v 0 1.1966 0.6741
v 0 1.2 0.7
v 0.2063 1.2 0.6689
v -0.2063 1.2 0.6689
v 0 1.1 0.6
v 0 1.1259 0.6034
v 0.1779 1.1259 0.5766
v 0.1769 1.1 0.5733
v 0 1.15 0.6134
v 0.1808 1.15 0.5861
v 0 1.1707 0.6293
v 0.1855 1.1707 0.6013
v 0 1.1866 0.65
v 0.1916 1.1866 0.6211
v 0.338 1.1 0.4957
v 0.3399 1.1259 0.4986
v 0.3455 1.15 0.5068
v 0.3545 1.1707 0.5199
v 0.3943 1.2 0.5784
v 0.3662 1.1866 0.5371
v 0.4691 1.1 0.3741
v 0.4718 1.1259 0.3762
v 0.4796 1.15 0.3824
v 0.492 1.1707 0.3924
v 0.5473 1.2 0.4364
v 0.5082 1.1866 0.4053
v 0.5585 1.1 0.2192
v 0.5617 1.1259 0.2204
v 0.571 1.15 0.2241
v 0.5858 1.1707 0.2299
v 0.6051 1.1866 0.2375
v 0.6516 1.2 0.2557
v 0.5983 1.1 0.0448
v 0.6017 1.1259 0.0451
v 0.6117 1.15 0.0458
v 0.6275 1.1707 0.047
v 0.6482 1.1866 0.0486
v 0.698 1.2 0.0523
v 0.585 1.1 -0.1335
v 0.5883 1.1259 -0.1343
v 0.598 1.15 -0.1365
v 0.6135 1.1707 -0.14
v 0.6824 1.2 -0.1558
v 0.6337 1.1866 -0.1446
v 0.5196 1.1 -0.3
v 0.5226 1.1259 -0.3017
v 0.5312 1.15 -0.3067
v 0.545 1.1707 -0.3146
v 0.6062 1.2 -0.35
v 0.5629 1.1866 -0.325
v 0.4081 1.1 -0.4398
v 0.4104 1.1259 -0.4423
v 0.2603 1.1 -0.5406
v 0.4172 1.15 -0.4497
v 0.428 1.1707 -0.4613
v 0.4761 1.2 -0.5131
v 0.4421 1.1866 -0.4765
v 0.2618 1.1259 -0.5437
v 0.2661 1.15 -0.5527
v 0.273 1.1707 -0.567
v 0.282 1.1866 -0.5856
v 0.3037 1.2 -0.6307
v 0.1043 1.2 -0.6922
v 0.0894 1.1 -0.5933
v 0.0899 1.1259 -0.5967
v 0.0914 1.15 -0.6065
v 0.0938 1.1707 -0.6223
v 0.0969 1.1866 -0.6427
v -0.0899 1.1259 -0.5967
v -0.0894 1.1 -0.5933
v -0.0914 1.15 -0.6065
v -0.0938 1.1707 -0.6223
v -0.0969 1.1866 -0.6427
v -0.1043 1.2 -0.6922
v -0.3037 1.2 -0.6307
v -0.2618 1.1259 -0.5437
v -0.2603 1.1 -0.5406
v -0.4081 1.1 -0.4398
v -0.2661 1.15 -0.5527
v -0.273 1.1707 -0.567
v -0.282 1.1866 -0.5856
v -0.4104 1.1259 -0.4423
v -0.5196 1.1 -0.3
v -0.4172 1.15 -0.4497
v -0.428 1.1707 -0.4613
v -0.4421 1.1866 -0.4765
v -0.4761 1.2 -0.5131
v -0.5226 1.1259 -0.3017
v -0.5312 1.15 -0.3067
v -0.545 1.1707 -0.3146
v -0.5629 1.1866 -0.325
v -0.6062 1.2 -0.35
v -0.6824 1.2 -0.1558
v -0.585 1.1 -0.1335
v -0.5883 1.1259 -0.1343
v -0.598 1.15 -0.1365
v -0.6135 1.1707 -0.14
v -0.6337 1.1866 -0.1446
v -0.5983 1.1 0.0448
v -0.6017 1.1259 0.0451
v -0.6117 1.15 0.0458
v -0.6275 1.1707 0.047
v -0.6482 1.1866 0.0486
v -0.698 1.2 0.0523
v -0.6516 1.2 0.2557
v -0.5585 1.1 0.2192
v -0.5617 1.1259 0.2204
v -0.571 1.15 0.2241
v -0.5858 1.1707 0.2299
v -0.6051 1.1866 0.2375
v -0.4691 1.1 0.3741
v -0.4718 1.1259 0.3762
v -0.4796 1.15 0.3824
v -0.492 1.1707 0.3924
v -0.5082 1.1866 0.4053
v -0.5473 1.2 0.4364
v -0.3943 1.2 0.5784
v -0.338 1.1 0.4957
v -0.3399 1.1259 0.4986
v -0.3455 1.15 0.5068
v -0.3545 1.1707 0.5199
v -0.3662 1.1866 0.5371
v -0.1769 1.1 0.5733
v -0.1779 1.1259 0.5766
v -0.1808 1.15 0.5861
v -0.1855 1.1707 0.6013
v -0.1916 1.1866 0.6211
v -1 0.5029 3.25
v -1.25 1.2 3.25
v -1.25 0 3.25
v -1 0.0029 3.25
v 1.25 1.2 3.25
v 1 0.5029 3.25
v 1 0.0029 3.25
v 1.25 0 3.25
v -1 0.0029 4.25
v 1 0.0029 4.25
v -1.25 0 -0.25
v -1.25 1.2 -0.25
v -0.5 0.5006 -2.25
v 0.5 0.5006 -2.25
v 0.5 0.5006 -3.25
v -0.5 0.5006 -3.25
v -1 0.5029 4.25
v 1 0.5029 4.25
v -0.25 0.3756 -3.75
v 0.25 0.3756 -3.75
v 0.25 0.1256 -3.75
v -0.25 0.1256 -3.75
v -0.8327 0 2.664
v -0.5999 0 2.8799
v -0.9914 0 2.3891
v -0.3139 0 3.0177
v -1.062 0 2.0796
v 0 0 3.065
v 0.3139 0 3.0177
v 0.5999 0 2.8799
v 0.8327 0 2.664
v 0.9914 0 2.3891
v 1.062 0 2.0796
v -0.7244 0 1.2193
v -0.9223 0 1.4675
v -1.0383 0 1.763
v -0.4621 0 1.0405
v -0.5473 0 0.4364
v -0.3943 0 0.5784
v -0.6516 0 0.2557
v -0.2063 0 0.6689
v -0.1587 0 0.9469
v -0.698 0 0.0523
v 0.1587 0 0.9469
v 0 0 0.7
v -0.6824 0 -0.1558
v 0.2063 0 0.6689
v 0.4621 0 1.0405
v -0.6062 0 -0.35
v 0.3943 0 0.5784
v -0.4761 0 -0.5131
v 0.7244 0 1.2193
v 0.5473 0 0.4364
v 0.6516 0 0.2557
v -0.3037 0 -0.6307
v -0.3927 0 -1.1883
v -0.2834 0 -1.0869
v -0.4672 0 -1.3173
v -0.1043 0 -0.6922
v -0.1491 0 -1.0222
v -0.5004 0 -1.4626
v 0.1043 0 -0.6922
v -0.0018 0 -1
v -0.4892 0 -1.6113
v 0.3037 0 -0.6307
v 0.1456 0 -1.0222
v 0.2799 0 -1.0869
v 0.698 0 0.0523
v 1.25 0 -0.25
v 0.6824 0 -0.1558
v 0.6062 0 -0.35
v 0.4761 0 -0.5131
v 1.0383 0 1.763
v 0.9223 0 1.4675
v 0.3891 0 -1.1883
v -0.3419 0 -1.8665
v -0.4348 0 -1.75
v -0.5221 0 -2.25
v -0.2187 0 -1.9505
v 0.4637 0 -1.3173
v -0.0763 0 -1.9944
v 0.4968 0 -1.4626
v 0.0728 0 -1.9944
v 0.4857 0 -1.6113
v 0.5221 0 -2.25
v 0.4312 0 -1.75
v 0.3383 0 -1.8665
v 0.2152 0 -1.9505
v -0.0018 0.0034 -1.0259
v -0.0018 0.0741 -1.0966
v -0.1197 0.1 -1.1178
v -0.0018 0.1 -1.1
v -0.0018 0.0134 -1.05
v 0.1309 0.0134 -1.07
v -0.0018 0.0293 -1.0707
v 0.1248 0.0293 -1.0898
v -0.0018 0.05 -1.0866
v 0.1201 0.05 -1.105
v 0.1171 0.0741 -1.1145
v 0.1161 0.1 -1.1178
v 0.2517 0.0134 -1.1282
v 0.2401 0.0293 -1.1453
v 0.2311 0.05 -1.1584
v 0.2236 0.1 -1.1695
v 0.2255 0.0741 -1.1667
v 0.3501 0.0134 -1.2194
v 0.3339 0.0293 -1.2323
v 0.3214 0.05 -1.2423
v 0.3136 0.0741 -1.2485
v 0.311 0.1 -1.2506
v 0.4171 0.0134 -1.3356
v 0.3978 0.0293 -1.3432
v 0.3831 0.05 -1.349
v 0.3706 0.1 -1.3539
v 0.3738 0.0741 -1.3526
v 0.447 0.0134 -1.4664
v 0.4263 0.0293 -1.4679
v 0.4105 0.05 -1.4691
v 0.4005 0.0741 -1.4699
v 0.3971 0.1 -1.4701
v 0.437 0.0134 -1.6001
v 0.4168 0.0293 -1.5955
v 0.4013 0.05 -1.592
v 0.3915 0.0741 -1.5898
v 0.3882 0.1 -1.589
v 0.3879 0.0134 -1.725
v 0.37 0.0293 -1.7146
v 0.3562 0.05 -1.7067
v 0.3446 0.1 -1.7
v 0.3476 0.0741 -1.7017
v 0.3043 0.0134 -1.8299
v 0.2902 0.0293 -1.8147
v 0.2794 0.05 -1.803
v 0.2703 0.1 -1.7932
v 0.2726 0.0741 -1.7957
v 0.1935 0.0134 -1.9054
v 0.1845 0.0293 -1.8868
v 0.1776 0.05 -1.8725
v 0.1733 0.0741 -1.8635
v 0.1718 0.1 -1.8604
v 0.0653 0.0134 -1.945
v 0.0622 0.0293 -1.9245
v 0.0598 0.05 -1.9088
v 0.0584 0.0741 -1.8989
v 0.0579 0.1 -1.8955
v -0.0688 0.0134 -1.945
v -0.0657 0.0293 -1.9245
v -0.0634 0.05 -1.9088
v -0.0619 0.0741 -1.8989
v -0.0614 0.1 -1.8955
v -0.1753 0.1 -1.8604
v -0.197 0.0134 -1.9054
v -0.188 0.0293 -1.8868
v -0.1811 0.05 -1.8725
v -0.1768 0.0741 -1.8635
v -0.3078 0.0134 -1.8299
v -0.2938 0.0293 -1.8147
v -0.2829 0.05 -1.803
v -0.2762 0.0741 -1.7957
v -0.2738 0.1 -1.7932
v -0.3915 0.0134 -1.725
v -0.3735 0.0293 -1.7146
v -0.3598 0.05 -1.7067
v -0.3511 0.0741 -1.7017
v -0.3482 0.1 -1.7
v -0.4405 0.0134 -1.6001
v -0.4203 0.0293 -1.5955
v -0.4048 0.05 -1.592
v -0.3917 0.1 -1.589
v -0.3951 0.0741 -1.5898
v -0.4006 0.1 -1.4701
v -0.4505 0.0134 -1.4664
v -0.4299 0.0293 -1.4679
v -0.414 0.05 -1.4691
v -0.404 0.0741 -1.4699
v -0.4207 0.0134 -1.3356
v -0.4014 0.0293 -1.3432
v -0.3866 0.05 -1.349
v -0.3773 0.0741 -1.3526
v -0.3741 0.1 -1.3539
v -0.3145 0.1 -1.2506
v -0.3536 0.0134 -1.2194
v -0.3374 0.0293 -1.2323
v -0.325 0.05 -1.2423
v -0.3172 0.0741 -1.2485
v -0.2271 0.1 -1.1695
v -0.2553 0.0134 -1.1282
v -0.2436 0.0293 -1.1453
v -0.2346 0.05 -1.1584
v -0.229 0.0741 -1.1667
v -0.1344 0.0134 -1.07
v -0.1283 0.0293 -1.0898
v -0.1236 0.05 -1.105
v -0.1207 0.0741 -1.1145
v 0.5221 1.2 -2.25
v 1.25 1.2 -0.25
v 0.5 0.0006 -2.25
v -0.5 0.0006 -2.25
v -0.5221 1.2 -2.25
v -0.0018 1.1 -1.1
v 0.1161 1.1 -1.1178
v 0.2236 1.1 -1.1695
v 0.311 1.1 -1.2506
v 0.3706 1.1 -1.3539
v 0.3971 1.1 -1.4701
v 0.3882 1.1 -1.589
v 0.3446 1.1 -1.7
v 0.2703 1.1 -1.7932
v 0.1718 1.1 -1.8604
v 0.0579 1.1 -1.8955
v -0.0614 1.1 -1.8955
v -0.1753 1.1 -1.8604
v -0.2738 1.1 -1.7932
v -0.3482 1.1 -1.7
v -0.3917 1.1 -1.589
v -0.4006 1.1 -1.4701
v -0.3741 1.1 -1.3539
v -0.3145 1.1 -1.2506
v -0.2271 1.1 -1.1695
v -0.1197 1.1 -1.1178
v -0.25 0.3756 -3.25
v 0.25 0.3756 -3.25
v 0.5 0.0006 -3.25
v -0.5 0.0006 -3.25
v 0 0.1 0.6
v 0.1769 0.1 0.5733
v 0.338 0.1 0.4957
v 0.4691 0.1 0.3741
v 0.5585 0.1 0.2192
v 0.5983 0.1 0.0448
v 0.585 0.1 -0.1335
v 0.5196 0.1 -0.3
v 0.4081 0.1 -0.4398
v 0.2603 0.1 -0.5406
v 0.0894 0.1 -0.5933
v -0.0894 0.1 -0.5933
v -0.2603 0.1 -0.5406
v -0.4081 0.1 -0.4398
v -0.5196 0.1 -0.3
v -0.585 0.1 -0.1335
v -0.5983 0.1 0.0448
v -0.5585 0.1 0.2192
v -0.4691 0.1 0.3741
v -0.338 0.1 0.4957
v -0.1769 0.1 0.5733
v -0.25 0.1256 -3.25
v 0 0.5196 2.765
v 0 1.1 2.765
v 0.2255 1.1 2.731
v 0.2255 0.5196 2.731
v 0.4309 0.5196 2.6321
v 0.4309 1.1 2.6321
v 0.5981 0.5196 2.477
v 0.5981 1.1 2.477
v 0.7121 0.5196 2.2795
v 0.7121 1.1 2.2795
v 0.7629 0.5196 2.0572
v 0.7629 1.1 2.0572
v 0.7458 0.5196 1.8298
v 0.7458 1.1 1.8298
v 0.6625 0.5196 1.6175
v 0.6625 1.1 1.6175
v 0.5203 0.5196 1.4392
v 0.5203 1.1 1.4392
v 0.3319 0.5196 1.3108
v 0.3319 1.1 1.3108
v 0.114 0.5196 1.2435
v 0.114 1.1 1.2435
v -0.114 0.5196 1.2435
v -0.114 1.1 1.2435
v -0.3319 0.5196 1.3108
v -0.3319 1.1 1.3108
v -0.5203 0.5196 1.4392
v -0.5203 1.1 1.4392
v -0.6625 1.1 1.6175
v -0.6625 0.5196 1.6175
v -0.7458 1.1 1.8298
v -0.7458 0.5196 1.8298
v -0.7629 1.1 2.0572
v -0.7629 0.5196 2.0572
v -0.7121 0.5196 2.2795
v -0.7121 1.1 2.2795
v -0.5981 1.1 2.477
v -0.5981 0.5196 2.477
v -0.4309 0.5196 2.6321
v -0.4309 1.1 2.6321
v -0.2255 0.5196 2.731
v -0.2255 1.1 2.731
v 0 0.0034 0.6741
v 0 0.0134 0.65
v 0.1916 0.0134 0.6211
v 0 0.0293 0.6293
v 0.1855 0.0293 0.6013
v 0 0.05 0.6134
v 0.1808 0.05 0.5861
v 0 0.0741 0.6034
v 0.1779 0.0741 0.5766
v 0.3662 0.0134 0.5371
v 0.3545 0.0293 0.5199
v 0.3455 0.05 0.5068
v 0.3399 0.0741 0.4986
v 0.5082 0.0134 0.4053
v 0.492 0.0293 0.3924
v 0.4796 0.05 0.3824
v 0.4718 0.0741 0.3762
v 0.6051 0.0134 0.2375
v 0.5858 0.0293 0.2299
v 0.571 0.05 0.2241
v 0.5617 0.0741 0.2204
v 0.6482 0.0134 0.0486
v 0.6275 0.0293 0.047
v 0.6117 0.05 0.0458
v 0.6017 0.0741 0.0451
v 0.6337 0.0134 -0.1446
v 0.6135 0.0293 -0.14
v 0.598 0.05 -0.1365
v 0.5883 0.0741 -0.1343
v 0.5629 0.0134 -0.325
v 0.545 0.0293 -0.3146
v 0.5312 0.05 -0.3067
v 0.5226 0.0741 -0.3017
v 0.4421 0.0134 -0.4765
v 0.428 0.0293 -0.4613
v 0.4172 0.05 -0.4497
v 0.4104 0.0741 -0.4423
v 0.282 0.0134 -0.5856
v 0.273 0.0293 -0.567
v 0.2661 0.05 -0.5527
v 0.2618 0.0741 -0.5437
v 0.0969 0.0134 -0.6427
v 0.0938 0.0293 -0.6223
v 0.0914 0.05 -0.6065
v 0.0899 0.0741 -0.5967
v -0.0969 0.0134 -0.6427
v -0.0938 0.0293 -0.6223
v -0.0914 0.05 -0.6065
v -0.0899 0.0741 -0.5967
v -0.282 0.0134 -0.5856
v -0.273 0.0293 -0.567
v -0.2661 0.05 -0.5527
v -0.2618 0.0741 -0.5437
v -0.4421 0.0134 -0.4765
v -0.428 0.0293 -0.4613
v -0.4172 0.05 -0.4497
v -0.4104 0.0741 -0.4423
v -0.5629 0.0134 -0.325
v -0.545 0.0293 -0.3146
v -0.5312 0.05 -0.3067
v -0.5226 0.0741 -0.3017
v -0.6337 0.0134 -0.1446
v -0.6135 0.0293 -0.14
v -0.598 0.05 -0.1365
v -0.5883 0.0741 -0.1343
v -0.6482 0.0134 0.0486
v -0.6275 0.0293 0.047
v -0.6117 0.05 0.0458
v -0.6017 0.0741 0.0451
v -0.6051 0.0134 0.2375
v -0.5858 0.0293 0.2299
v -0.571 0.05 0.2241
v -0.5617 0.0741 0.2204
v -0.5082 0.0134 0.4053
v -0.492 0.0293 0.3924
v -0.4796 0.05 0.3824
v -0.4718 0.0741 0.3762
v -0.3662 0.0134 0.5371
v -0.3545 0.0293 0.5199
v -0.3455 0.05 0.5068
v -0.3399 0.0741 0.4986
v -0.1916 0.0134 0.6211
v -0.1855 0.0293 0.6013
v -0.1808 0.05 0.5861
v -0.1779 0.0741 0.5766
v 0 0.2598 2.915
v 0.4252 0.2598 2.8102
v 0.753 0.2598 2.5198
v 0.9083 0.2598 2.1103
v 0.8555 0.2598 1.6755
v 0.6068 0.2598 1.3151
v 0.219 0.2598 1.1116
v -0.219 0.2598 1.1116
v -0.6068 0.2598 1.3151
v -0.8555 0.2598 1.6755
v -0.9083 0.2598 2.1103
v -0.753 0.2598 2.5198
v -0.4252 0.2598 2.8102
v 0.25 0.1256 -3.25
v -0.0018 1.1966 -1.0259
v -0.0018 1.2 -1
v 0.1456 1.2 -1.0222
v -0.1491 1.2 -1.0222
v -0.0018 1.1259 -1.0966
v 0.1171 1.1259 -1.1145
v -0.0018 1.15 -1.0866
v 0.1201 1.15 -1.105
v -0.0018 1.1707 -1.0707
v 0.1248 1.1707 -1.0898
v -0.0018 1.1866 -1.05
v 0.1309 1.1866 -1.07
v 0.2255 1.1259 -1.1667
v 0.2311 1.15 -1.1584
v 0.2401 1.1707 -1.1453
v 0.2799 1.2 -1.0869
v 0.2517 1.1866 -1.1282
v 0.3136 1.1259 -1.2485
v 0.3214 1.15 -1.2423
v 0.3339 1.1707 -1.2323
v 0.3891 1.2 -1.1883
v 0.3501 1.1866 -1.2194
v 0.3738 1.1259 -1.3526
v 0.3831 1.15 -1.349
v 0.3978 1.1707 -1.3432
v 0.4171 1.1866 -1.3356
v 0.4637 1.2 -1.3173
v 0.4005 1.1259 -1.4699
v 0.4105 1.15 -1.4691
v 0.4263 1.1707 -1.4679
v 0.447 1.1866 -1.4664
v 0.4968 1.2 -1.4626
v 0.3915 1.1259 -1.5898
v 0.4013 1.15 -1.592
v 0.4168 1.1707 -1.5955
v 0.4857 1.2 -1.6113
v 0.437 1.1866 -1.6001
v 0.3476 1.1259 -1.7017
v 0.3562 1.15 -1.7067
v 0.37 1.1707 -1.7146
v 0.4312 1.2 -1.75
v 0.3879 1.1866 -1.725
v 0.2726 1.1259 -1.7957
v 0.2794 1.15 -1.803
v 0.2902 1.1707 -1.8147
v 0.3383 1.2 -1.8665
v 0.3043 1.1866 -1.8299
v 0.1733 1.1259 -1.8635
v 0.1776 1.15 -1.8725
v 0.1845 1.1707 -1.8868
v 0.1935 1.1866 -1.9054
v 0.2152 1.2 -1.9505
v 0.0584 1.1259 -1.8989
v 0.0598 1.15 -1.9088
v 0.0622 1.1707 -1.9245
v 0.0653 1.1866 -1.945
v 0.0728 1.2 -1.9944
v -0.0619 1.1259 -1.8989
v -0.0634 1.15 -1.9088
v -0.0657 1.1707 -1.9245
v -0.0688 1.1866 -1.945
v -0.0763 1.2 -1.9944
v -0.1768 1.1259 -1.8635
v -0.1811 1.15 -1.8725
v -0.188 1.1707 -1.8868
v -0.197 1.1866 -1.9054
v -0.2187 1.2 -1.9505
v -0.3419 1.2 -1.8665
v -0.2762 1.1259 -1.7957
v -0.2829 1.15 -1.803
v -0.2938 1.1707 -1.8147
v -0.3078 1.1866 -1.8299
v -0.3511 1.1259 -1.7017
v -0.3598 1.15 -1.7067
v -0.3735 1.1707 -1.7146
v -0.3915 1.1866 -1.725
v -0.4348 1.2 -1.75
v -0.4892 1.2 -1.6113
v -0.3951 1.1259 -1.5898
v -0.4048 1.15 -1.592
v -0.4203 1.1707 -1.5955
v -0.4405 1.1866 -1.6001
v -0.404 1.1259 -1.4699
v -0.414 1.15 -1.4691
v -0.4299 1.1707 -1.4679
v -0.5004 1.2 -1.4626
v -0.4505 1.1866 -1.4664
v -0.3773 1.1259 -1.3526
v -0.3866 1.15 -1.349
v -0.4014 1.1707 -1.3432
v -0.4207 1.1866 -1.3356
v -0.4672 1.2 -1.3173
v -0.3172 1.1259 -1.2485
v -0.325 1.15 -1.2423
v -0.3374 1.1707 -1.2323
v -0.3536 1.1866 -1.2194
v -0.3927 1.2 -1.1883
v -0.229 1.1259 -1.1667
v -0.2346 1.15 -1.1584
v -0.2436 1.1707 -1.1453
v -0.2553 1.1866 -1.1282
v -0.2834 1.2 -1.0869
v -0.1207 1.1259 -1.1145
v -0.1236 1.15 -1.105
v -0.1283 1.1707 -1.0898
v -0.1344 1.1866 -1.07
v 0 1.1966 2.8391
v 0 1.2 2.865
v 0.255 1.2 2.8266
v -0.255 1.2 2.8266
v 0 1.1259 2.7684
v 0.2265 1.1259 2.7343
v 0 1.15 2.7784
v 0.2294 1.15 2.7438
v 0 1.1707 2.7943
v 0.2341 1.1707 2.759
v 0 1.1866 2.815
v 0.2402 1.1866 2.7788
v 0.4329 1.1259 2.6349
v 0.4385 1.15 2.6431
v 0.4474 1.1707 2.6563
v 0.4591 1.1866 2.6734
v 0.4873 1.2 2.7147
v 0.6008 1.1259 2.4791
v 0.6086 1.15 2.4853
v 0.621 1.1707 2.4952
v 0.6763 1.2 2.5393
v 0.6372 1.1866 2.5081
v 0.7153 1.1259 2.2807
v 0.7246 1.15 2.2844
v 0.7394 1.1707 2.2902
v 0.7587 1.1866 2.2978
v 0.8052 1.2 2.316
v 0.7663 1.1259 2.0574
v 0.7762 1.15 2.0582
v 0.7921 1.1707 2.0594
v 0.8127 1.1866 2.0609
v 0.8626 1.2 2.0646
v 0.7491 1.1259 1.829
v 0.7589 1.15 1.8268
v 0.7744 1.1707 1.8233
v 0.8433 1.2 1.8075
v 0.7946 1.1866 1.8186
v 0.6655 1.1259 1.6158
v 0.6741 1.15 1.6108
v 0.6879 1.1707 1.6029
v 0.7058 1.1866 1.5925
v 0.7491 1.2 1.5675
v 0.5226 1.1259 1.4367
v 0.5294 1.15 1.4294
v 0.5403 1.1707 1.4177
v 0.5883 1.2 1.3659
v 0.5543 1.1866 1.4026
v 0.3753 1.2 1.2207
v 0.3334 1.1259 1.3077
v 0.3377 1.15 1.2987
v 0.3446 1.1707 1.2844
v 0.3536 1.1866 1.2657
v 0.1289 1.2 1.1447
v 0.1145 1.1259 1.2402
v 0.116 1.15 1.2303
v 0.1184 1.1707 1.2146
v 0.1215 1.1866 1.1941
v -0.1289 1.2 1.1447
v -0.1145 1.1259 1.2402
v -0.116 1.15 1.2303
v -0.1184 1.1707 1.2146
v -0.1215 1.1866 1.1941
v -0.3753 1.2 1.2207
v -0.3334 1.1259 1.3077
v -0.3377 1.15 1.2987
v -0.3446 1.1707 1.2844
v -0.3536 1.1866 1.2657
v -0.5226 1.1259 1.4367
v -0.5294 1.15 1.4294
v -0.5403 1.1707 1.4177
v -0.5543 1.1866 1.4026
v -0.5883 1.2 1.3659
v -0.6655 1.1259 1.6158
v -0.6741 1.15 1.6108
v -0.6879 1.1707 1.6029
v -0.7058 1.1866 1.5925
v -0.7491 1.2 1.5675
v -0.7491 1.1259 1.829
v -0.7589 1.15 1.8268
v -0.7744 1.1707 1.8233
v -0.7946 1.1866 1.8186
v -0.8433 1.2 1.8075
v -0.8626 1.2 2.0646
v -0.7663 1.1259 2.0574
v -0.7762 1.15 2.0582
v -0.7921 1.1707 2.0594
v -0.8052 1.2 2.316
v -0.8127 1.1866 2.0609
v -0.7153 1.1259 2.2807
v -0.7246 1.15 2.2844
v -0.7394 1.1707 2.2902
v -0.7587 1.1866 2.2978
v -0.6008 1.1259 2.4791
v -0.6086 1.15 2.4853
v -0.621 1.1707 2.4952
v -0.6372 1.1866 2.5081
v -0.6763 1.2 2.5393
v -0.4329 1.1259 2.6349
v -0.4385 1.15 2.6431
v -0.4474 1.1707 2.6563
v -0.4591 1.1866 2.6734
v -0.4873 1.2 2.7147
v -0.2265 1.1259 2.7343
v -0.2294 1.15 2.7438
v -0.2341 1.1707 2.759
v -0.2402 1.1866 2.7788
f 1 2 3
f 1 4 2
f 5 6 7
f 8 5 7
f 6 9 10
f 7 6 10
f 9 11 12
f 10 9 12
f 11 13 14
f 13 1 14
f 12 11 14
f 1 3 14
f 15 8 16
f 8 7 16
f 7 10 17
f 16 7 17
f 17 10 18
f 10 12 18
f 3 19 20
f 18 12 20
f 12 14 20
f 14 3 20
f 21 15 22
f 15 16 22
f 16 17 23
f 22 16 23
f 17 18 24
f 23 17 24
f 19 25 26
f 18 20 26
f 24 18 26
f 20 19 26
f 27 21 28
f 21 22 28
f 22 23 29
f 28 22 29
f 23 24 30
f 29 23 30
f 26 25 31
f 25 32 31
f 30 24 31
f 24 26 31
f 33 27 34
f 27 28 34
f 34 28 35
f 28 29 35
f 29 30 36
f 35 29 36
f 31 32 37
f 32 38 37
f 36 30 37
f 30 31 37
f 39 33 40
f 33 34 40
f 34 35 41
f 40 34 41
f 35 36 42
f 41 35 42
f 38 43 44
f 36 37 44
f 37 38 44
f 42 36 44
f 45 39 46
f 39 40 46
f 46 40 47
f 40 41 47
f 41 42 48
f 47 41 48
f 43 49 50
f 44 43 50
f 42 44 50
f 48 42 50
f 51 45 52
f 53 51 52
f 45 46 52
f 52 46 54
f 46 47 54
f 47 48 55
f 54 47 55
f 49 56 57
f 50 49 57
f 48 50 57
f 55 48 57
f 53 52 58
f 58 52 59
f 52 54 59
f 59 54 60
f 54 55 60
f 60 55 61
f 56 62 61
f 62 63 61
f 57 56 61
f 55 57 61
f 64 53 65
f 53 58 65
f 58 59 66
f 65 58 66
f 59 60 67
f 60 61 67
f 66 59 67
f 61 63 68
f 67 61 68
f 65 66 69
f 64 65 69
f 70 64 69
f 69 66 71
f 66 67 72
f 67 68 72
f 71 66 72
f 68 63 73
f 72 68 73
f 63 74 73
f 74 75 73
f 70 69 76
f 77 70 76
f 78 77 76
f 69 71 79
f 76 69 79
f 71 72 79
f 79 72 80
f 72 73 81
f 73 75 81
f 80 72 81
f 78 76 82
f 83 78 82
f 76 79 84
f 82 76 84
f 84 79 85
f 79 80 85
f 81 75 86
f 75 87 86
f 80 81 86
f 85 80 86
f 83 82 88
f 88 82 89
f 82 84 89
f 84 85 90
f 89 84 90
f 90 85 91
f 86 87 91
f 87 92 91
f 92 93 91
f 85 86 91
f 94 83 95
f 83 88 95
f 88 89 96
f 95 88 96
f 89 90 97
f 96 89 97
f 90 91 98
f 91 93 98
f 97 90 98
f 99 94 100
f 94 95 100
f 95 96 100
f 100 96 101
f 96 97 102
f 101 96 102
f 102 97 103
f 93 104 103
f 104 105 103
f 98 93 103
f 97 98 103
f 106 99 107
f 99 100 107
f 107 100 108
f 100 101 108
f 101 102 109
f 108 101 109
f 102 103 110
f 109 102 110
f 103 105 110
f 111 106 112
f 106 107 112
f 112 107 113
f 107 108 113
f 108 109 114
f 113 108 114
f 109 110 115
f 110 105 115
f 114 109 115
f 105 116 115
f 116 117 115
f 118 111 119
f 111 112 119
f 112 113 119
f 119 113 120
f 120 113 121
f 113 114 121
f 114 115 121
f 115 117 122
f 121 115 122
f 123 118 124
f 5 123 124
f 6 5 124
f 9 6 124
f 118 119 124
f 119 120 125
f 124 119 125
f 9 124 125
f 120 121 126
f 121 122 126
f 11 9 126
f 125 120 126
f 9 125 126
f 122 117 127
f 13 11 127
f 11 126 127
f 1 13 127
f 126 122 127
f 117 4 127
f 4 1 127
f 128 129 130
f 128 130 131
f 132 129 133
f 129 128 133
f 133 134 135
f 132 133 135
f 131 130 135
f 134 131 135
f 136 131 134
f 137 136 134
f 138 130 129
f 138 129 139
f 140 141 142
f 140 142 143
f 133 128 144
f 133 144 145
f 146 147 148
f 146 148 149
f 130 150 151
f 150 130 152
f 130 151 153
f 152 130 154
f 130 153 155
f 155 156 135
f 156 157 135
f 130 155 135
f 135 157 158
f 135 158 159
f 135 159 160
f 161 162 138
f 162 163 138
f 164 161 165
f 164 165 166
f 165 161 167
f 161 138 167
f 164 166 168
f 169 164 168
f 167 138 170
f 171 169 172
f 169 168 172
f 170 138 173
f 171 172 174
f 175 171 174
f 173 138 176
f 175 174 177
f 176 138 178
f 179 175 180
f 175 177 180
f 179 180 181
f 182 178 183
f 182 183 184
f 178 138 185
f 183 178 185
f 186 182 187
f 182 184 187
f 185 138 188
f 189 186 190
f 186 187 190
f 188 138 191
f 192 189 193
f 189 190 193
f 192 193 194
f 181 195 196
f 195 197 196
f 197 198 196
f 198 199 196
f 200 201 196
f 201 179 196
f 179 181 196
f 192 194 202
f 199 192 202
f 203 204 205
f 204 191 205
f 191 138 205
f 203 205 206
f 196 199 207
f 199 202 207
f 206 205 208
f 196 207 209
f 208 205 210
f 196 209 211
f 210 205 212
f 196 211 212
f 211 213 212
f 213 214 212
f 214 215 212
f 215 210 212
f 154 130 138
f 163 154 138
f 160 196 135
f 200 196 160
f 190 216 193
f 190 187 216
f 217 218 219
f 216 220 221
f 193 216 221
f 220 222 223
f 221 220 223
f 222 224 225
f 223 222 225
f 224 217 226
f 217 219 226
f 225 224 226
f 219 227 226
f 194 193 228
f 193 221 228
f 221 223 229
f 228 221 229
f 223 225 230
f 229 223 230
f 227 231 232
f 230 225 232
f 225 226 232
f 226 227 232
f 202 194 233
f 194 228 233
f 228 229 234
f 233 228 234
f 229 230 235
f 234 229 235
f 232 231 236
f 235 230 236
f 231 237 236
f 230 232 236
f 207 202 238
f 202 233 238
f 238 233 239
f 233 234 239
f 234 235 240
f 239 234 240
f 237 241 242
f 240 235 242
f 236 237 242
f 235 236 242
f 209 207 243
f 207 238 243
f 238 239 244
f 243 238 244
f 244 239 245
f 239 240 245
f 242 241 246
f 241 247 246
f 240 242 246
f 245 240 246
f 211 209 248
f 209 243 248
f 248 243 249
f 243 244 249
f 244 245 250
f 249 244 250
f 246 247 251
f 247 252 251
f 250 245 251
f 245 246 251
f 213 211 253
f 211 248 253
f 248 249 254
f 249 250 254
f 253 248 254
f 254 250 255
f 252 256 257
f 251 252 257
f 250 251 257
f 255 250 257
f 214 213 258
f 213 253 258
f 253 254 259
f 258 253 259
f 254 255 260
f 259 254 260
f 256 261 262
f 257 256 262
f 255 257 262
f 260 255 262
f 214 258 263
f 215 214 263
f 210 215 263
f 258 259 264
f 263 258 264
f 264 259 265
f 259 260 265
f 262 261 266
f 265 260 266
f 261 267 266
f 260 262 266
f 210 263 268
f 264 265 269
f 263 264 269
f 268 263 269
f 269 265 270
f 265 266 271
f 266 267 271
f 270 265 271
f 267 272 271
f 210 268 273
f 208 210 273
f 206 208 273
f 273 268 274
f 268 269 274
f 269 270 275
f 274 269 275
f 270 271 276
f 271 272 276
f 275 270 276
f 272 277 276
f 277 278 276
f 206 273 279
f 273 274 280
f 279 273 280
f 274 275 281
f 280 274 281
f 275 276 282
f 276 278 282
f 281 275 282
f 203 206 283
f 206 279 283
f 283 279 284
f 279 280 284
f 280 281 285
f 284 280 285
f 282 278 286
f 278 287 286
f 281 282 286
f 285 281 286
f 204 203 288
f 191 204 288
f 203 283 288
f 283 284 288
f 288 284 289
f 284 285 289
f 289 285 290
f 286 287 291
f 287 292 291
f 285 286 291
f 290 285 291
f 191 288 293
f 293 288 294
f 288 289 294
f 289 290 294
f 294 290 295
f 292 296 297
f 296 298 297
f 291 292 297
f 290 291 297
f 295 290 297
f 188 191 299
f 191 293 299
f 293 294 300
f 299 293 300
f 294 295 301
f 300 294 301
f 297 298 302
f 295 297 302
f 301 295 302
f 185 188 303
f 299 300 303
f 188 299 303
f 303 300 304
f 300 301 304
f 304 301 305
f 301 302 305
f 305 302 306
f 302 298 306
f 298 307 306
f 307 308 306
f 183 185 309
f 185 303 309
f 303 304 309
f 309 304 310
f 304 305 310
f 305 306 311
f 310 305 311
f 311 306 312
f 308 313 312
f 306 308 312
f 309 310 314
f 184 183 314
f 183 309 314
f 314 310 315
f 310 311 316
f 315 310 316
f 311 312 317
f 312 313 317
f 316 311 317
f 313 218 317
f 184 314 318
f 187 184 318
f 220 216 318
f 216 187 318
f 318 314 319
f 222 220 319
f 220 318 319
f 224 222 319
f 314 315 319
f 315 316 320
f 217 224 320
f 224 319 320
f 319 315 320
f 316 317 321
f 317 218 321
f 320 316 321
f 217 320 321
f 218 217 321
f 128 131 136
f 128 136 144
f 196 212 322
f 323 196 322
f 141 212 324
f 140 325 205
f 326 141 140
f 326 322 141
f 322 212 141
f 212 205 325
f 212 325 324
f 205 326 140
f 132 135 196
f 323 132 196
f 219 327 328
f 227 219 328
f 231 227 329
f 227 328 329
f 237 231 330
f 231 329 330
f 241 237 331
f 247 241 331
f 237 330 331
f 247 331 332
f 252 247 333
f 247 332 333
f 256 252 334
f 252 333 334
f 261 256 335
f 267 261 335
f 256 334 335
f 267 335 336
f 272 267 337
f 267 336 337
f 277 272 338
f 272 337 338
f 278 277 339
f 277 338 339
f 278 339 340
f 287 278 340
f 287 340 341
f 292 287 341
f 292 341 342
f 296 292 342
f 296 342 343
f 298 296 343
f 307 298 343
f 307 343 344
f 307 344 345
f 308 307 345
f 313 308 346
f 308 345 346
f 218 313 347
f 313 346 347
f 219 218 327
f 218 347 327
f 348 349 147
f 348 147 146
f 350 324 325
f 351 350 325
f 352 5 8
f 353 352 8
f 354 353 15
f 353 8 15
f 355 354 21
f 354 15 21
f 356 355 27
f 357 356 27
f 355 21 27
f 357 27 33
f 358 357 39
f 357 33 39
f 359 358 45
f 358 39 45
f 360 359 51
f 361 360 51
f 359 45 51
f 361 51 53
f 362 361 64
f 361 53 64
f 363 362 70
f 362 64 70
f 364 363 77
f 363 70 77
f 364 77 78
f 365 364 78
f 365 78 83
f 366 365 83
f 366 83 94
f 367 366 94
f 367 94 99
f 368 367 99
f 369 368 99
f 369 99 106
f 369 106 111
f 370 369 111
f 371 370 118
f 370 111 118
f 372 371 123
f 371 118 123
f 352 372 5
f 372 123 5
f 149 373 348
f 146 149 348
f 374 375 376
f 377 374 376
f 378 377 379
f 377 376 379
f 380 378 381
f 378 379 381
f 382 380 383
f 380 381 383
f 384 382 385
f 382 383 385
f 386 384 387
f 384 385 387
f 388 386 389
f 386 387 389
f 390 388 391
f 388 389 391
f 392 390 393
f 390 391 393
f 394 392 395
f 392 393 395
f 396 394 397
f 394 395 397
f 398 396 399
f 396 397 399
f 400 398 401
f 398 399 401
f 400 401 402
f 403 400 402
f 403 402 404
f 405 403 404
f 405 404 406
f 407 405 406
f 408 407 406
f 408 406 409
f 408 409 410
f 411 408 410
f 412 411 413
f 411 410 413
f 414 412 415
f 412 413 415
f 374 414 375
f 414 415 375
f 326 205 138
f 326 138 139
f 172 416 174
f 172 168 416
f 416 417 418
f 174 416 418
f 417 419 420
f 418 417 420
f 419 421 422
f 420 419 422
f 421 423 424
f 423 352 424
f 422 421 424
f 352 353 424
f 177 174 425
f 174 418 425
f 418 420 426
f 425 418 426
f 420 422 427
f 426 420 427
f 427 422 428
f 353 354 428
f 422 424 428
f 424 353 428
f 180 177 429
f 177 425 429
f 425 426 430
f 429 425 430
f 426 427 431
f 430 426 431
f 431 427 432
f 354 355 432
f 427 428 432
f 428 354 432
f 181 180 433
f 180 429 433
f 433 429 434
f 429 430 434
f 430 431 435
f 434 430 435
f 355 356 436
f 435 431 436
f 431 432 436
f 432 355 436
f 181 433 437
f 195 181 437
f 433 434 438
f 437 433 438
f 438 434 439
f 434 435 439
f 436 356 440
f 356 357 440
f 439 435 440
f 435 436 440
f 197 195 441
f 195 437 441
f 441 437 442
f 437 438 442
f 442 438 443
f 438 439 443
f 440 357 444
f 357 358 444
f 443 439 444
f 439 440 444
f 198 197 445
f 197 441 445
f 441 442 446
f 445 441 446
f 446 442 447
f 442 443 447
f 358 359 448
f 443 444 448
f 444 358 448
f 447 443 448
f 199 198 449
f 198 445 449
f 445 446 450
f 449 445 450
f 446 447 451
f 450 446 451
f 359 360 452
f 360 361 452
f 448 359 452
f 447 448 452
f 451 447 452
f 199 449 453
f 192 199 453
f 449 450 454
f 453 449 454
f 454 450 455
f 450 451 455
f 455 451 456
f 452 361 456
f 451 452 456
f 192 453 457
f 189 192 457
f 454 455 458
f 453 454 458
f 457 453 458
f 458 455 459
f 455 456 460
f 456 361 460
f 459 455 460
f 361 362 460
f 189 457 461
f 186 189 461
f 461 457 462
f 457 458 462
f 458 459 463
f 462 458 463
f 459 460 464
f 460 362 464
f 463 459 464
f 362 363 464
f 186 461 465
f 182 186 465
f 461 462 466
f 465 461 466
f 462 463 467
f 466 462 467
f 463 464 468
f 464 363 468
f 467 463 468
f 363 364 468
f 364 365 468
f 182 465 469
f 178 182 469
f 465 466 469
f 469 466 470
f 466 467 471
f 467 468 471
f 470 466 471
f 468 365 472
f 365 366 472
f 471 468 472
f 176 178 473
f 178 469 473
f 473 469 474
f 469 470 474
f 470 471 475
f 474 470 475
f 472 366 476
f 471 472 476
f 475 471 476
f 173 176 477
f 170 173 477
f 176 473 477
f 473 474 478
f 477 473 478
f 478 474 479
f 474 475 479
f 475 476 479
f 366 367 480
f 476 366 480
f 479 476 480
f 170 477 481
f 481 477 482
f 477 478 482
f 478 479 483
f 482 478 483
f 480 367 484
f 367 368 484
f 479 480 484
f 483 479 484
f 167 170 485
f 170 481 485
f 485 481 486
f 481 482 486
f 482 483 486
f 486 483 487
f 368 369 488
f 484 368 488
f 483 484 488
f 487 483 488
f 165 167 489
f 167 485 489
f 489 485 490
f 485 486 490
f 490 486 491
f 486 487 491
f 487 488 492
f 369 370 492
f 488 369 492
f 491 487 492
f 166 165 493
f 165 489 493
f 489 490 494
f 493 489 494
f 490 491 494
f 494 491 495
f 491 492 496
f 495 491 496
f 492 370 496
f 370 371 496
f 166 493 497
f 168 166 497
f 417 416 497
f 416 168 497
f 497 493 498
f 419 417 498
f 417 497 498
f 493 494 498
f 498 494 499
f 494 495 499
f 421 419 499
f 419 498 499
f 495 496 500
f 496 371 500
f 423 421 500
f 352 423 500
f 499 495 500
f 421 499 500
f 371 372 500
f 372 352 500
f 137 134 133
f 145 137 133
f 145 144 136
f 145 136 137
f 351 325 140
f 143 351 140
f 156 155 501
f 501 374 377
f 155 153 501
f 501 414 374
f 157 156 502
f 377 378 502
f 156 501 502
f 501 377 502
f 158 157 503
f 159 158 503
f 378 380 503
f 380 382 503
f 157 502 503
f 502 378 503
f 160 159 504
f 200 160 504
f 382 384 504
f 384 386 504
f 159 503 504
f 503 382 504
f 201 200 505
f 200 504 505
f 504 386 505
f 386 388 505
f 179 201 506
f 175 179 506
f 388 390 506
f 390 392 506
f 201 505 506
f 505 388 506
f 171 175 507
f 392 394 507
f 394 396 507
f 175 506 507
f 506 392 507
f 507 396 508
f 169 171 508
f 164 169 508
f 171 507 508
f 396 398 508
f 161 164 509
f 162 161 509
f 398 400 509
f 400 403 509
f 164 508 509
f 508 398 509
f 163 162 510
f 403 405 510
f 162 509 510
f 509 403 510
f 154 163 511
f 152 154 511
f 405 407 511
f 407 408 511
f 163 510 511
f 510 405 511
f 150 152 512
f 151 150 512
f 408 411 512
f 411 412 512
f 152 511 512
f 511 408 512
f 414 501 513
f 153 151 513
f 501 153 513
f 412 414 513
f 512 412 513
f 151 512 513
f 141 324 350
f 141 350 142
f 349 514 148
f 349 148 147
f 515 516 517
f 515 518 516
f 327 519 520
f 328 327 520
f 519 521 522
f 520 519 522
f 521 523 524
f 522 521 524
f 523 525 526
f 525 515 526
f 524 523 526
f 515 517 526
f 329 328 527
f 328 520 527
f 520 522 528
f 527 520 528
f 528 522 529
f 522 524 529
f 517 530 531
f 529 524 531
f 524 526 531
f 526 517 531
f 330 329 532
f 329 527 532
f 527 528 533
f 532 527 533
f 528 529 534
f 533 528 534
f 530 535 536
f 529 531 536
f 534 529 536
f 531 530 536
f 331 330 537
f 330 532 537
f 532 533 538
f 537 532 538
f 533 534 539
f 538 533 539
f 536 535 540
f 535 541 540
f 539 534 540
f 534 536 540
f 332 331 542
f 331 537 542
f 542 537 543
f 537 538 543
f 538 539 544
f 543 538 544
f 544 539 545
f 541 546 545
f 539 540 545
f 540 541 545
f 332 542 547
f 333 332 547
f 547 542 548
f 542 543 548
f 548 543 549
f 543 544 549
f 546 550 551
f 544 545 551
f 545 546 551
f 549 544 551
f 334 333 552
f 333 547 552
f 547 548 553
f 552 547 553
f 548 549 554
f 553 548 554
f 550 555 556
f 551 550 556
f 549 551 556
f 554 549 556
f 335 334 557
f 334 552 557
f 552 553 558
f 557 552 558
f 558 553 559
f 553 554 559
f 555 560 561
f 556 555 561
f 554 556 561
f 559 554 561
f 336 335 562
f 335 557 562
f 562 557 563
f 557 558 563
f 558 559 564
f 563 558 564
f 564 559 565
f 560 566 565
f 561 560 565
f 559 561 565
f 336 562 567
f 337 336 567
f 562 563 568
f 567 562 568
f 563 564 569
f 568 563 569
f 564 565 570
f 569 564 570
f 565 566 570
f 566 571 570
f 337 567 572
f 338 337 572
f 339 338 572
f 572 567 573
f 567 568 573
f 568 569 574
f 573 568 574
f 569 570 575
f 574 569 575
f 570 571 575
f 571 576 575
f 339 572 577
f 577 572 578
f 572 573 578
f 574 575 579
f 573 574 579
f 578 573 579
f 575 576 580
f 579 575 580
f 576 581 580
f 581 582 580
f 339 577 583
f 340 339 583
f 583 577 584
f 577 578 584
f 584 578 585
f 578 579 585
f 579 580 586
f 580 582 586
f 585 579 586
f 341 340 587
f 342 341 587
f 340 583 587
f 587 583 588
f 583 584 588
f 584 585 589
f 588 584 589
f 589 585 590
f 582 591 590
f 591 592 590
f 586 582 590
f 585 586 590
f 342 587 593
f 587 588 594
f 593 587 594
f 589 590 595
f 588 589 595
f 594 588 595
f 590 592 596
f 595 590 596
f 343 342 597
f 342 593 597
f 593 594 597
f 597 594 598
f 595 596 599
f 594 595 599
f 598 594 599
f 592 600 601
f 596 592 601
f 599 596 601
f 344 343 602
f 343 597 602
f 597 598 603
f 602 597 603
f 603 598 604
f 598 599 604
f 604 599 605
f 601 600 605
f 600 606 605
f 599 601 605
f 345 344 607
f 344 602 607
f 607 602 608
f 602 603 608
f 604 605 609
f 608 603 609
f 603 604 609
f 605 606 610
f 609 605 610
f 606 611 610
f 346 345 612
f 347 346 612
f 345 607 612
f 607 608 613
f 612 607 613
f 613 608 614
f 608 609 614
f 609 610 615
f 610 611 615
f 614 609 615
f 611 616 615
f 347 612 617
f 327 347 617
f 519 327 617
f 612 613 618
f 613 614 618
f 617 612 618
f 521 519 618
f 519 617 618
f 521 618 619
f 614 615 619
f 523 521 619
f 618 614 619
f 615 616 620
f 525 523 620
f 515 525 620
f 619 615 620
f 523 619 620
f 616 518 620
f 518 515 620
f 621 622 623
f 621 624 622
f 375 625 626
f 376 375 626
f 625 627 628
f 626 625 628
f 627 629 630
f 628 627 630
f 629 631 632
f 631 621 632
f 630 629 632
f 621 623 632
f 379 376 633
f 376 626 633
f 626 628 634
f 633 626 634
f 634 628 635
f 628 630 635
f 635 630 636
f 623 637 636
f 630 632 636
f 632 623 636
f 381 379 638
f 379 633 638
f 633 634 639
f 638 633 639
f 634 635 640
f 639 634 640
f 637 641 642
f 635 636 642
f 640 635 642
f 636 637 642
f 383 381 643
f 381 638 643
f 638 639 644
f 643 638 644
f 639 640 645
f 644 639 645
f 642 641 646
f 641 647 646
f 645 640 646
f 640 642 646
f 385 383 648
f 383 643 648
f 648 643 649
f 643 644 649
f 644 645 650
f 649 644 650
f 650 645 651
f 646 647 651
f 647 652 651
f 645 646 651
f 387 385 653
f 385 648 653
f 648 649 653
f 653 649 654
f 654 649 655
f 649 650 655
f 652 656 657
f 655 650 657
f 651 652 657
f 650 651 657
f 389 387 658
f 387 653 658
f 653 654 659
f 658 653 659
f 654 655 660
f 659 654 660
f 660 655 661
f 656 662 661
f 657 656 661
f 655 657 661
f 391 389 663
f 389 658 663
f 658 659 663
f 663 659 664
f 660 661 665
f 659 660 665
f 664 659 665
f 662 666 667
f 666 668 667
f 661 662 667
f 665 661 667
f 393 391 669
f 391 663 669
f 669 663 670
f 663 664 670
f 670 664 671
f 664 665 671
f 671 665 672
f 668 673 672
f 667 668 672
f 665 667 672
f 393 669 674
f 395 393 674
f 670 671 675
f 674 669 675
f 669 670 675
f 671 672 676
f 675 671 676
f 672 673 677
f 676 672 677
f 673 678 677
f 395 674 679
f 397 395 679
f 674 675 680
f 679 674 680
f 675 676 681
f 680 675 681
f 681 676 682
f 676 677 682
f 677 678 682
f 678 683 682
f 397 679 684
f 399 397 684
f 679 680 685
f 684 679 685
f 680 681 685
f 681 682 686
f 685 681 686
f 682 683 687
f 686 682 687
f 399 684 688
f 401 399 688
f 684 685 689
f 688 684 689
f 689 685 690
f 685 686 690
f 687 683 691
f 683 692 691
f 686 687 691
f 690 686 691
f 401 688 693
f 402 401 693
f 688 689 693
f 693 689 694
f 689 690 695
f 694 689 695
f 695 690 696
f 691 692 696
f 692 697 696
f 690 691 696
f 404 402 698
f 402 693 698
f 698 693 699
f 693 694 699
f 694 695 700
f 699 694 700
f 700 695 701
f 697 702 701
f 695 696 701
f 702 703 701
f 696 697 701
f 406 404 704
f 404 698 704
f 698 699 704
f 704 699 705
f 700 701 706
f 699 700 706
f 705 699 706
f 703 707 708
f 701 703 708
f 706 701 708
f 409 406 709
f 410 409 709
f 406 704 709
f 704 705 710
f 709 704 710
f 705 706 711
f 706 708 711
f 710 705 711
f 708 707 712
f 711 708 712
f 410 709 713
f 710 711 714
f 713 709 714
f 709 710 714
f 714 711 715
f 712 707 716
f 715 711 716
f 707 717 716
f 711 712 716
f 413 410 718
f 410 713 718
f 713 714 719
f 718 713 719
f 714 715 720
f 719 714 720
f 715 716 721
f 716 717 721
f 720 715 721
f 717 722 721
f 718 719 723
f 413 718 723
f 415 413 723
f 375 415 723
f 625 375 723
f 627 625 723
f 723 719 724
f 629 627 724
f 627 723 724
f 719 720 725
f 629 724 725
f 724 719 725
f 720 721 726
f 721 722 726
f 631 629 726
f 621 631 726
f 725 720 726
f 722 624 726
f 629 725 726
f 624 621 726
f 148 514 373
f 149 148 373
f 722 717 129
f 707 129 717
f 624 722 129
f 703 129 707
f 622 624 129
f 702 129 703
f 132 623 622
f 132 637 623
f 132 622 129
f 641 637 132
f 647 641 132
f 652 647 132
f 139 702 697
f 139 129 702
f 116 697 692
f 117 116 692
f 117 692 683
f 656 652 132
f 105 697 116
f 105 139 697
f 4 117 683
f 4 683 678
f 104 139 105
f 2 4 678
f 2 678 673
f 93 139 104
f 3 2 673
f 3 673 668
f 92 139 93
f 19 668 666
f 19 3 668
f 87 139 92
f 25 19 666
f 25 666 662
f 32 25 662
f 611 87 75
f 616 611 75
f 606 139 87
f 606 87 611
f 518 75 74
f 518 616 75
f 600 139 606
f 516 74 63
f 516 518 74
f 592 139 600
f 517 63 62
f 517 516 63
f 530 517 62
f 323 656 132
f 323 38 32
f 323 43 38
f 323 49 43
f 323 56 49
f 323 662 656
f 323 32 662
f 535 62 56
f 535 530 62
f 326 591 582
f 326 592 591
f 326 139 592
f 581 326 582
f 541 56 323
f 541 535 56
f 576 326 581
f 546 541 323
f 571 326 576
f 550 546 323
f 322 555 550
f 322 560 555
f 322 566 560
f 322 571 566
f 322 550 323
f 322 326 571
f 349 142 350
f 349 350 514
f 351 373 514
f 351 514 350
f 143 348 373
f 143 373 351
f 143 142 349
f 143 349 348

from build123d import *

# Parameters (mm, degrees)
SKETCH1_W           = 2.5
SKETCH1_H           = 6.5
BOSS_EXTRUDE1_DEPTH = 1.2
SKETCH2_R           = 0.6
SKETCH2_R_2         = 0.765
SKETCH2_R_3         = 0.4
CUT_EXTRUDE1_DEPTH  = 1.2
CHAMFER1_SIZE       = 3
CHAMFER1_SIZE2      = 1.091910703
CHAMFER2_SIZE       = 3
CHAMFER2_SIZE2      = 1.091910703
SKETCH3_W           = 2.5
SKETCH3_H           = 1.2
CUT_EXTRUDE2_DEPTH  = 1
CHAMFER3_SIZE       = 0.3
CHAMFER3_SIZE2      = 0.519615242
FILLET1_R           = 0.1
SKETCH4_W           = 1
SKETCH4_H           = 0.5
BOSS_EXTRUDE2_DEPTH = 1
SKETCH5_W           = 2
SKETCH5_H           = 0.5
BOSS_EXTRUDE3_DEPTH = 1
SKETCH6_W           = 0.5
SKETCH6_H           = 0.25
BOSS_EXTRUDE4_DEPTH = 0.5
SKETCH8_W           = 1
SKETCH8_H           = 0.25
BOSS_EXTRUDE6_DEPTH = 0.5
SKETCH9_W           = 2.896936236
SKETCH9_H           = 1.571826666
CUT_EXTRUDE3_DEPTH  = 129.011727979


# Read off the part's stored shape, not the designer's step: Mirror2, Mirror4, Mirror6, Mirror7
with BuildPart() as part:
    # Sketch1 → Boss-Extrude1 (new body)
    with BuildSketch(Plane(origin=(0, 0, 0), x_dir=(1, 0, 0), z_dir=(0, 1, 0))):
        Rectangle(SKETCH1_W, SKETCH1_H)
    extrude(amount=BOSS_EXTRUDE1_DEPTH)

    # Sketch2 → Cut-Extrude1 (cut)
    with BuildSketch(Plane(origin=(0, 1.2, 0), x_dir=(1, 0, 0), z_dir=(0, 1, 0))):
        with Locations(Location((0, 0, 0), (0, 0, 270))):
            Circle(SKETCH2_R)
        with Locations(Location((0, -2, 0), (0, 0, 270))):
            Circle(SKETCH2_R_2)
        with Locations(Location((-0.001766606, 1.5, 0), (0, 0, 270))):
            Circle(SKETCH2_R_3)
    extrude(amount=-CUT_EXTRUDE1_DEPTH, mode=Mode.SUBTRACT)

    # Chamfer1
    chamfer1_edges = [part.edges().sort_by_distance(p)[0] for p in [
        (1.25, 0.6, -3.25),
    ]]
    chamfer1_side = [part.faces().sort_by_distance(p)[0] for p in [
        (1.25, 0.6, 0),
    ]]
    chamfer(chamfer1_edges, length=CHAMFER1_SIZE, length2=CHAMFER1_SIZE2, reference=chamfer1_side[0])

    # Chamfer2
    chamfer2_edges = [part.edges().sort_by_distance(p)[0] for p in [
        (-1.25, 0.6, -3.25),
    ]]
    chamfer2_side = [part.faces().sort_by_distance(p)[0] for p in [
        (-1.25, 0.6, 0),
    ]]
    chamfer(chamfer2_edges, length=CHAMFER2_SIZE, length2=CHAMFER2_SIZE2, reference=chamfer2_side[0])

    # Sketch3 → Cut-Extrude2 (cut)
    with BuildSketch(Plane(origin=(0, 0, -3.25), x_dir=(-1, 0, 0), z_dir=(0, 0, -1))):
        with Locations((0, 0.6)):
            Rectangle(SKETCH3_W, SKETCH3_H)
    extrude(amount=-CUT_EXTRUDE2_DEPTH, mode=Mode.SUBTRACT)

    # Chamfer3
    chamfer3_edges = [part.edges().sort_by_distance(p)[0] for p in [
        (0, 0, 1.235),
    ]]
    chamfer3_side = [part.faces().sort_by_distance(p)[0] for p in [
        (0.000100657, 0, 0.709259096),
    ]]
    chamfer(chamfer3_edges, length=CHAMFER3_SIZE, length2=CHAMFER3_SIZE2, reference=chamfer3_side[0])

    # Fillet1
    fillet1_edges = [part.edges().sort_by_distance(p)[0] for p in [
        (0, 0, -0.6),
        (0, 1.2, -0.6),
        (0, 1.2, 1.235),
        (-0.001766606, 0, -1.9),
        (-0.001766606, 1.2, -1.9),
    ]]
    fillet(fillet1_edges, radius=FILLET1_R)

    # Sketch4 → Boss-Extrude2 (add)
    with BuildSketch(Plane(origin=(0, 0, -2.25), x_dir=(-1, 0, 0), z_dir=(0, 0, -1))):
        with Locations((0, 0.250555681)):
            Rectangle(SKETCH4_W, SKETCH4_H)
    extrude(amount=BOSS_EXTRUDE2_DEPTH)

    # Sketch5 → Boss-Extrude3 (add)
    with BuildSketch(Plane.XY.offset(3.25)):
        with Locations((0, 0.252908482)):
            Rectangle(SKETCH5_W, SKETCH5_H)
    extrude(amount=BOSS_EXTRUDE3_DEPTH)

    # Sketch6 → Boss-Extrude4 (add)
    with BuildSketch(Plane(origin=(0, 0, -3.25), x_dir=(-1, 0, 0), z_dir=(0, 0, -1))):
        with Locations((0, 0.250555681)):
            Rectangle(SKETCH6_W, SKETCH6_H)
    extrude(amount=BOSS_EXTRUDE4_DEPTH)

    # Sketch8 → Boss-Extrude6 (add)
    with BuildSketch(Plane.XY.offset(4.25)):
        with Locations((0, 0.252908482)):
            Rectangle(SKETCH8_W, SKETCH8_H)
    extrude(amount=BOSS_EXTRUDE6_DEPTH)

    # Mirror2: part across plane


with BuildPart() as part_1:
    add(part.part)
    add(part.part.mirror(Plane(origin=(0, 0, 4.75), x_dir=(1, 0, 0), z_dir=(0, 0, -1))))

    # Mirror4: part across plane


with BuildPart() as part_2:
    add(part_1.part)
    add(part_1.part.mirror(Plane.XY.offset(13.25)))

    # Mirror6: part across plane


with BuildPart() as part_3:
    add(part_2.part)
    add(part_2.part.mirror(Plane.XY.offset(30.25)))

    # Mirror7: part across plane


with BuildPart() as part_4:
    add(part_3.part)
    add(part_3.part.mirror(Plane.XY.offset(64.25)))

    # Sketch9 → Cut-Extrude3 (cut, through all)
    with BuildSketch(Plane.XY.offset(4.25)):
        with Locations((0.013927578, 0.592041384)):
            Rectangle(SKETCH9_W, SKETCH9_H)
    extrude(amount=CUT_EXTRUDE3_DEPTH, mode=Mode.SUBTRACT)


solid = part_4.part
